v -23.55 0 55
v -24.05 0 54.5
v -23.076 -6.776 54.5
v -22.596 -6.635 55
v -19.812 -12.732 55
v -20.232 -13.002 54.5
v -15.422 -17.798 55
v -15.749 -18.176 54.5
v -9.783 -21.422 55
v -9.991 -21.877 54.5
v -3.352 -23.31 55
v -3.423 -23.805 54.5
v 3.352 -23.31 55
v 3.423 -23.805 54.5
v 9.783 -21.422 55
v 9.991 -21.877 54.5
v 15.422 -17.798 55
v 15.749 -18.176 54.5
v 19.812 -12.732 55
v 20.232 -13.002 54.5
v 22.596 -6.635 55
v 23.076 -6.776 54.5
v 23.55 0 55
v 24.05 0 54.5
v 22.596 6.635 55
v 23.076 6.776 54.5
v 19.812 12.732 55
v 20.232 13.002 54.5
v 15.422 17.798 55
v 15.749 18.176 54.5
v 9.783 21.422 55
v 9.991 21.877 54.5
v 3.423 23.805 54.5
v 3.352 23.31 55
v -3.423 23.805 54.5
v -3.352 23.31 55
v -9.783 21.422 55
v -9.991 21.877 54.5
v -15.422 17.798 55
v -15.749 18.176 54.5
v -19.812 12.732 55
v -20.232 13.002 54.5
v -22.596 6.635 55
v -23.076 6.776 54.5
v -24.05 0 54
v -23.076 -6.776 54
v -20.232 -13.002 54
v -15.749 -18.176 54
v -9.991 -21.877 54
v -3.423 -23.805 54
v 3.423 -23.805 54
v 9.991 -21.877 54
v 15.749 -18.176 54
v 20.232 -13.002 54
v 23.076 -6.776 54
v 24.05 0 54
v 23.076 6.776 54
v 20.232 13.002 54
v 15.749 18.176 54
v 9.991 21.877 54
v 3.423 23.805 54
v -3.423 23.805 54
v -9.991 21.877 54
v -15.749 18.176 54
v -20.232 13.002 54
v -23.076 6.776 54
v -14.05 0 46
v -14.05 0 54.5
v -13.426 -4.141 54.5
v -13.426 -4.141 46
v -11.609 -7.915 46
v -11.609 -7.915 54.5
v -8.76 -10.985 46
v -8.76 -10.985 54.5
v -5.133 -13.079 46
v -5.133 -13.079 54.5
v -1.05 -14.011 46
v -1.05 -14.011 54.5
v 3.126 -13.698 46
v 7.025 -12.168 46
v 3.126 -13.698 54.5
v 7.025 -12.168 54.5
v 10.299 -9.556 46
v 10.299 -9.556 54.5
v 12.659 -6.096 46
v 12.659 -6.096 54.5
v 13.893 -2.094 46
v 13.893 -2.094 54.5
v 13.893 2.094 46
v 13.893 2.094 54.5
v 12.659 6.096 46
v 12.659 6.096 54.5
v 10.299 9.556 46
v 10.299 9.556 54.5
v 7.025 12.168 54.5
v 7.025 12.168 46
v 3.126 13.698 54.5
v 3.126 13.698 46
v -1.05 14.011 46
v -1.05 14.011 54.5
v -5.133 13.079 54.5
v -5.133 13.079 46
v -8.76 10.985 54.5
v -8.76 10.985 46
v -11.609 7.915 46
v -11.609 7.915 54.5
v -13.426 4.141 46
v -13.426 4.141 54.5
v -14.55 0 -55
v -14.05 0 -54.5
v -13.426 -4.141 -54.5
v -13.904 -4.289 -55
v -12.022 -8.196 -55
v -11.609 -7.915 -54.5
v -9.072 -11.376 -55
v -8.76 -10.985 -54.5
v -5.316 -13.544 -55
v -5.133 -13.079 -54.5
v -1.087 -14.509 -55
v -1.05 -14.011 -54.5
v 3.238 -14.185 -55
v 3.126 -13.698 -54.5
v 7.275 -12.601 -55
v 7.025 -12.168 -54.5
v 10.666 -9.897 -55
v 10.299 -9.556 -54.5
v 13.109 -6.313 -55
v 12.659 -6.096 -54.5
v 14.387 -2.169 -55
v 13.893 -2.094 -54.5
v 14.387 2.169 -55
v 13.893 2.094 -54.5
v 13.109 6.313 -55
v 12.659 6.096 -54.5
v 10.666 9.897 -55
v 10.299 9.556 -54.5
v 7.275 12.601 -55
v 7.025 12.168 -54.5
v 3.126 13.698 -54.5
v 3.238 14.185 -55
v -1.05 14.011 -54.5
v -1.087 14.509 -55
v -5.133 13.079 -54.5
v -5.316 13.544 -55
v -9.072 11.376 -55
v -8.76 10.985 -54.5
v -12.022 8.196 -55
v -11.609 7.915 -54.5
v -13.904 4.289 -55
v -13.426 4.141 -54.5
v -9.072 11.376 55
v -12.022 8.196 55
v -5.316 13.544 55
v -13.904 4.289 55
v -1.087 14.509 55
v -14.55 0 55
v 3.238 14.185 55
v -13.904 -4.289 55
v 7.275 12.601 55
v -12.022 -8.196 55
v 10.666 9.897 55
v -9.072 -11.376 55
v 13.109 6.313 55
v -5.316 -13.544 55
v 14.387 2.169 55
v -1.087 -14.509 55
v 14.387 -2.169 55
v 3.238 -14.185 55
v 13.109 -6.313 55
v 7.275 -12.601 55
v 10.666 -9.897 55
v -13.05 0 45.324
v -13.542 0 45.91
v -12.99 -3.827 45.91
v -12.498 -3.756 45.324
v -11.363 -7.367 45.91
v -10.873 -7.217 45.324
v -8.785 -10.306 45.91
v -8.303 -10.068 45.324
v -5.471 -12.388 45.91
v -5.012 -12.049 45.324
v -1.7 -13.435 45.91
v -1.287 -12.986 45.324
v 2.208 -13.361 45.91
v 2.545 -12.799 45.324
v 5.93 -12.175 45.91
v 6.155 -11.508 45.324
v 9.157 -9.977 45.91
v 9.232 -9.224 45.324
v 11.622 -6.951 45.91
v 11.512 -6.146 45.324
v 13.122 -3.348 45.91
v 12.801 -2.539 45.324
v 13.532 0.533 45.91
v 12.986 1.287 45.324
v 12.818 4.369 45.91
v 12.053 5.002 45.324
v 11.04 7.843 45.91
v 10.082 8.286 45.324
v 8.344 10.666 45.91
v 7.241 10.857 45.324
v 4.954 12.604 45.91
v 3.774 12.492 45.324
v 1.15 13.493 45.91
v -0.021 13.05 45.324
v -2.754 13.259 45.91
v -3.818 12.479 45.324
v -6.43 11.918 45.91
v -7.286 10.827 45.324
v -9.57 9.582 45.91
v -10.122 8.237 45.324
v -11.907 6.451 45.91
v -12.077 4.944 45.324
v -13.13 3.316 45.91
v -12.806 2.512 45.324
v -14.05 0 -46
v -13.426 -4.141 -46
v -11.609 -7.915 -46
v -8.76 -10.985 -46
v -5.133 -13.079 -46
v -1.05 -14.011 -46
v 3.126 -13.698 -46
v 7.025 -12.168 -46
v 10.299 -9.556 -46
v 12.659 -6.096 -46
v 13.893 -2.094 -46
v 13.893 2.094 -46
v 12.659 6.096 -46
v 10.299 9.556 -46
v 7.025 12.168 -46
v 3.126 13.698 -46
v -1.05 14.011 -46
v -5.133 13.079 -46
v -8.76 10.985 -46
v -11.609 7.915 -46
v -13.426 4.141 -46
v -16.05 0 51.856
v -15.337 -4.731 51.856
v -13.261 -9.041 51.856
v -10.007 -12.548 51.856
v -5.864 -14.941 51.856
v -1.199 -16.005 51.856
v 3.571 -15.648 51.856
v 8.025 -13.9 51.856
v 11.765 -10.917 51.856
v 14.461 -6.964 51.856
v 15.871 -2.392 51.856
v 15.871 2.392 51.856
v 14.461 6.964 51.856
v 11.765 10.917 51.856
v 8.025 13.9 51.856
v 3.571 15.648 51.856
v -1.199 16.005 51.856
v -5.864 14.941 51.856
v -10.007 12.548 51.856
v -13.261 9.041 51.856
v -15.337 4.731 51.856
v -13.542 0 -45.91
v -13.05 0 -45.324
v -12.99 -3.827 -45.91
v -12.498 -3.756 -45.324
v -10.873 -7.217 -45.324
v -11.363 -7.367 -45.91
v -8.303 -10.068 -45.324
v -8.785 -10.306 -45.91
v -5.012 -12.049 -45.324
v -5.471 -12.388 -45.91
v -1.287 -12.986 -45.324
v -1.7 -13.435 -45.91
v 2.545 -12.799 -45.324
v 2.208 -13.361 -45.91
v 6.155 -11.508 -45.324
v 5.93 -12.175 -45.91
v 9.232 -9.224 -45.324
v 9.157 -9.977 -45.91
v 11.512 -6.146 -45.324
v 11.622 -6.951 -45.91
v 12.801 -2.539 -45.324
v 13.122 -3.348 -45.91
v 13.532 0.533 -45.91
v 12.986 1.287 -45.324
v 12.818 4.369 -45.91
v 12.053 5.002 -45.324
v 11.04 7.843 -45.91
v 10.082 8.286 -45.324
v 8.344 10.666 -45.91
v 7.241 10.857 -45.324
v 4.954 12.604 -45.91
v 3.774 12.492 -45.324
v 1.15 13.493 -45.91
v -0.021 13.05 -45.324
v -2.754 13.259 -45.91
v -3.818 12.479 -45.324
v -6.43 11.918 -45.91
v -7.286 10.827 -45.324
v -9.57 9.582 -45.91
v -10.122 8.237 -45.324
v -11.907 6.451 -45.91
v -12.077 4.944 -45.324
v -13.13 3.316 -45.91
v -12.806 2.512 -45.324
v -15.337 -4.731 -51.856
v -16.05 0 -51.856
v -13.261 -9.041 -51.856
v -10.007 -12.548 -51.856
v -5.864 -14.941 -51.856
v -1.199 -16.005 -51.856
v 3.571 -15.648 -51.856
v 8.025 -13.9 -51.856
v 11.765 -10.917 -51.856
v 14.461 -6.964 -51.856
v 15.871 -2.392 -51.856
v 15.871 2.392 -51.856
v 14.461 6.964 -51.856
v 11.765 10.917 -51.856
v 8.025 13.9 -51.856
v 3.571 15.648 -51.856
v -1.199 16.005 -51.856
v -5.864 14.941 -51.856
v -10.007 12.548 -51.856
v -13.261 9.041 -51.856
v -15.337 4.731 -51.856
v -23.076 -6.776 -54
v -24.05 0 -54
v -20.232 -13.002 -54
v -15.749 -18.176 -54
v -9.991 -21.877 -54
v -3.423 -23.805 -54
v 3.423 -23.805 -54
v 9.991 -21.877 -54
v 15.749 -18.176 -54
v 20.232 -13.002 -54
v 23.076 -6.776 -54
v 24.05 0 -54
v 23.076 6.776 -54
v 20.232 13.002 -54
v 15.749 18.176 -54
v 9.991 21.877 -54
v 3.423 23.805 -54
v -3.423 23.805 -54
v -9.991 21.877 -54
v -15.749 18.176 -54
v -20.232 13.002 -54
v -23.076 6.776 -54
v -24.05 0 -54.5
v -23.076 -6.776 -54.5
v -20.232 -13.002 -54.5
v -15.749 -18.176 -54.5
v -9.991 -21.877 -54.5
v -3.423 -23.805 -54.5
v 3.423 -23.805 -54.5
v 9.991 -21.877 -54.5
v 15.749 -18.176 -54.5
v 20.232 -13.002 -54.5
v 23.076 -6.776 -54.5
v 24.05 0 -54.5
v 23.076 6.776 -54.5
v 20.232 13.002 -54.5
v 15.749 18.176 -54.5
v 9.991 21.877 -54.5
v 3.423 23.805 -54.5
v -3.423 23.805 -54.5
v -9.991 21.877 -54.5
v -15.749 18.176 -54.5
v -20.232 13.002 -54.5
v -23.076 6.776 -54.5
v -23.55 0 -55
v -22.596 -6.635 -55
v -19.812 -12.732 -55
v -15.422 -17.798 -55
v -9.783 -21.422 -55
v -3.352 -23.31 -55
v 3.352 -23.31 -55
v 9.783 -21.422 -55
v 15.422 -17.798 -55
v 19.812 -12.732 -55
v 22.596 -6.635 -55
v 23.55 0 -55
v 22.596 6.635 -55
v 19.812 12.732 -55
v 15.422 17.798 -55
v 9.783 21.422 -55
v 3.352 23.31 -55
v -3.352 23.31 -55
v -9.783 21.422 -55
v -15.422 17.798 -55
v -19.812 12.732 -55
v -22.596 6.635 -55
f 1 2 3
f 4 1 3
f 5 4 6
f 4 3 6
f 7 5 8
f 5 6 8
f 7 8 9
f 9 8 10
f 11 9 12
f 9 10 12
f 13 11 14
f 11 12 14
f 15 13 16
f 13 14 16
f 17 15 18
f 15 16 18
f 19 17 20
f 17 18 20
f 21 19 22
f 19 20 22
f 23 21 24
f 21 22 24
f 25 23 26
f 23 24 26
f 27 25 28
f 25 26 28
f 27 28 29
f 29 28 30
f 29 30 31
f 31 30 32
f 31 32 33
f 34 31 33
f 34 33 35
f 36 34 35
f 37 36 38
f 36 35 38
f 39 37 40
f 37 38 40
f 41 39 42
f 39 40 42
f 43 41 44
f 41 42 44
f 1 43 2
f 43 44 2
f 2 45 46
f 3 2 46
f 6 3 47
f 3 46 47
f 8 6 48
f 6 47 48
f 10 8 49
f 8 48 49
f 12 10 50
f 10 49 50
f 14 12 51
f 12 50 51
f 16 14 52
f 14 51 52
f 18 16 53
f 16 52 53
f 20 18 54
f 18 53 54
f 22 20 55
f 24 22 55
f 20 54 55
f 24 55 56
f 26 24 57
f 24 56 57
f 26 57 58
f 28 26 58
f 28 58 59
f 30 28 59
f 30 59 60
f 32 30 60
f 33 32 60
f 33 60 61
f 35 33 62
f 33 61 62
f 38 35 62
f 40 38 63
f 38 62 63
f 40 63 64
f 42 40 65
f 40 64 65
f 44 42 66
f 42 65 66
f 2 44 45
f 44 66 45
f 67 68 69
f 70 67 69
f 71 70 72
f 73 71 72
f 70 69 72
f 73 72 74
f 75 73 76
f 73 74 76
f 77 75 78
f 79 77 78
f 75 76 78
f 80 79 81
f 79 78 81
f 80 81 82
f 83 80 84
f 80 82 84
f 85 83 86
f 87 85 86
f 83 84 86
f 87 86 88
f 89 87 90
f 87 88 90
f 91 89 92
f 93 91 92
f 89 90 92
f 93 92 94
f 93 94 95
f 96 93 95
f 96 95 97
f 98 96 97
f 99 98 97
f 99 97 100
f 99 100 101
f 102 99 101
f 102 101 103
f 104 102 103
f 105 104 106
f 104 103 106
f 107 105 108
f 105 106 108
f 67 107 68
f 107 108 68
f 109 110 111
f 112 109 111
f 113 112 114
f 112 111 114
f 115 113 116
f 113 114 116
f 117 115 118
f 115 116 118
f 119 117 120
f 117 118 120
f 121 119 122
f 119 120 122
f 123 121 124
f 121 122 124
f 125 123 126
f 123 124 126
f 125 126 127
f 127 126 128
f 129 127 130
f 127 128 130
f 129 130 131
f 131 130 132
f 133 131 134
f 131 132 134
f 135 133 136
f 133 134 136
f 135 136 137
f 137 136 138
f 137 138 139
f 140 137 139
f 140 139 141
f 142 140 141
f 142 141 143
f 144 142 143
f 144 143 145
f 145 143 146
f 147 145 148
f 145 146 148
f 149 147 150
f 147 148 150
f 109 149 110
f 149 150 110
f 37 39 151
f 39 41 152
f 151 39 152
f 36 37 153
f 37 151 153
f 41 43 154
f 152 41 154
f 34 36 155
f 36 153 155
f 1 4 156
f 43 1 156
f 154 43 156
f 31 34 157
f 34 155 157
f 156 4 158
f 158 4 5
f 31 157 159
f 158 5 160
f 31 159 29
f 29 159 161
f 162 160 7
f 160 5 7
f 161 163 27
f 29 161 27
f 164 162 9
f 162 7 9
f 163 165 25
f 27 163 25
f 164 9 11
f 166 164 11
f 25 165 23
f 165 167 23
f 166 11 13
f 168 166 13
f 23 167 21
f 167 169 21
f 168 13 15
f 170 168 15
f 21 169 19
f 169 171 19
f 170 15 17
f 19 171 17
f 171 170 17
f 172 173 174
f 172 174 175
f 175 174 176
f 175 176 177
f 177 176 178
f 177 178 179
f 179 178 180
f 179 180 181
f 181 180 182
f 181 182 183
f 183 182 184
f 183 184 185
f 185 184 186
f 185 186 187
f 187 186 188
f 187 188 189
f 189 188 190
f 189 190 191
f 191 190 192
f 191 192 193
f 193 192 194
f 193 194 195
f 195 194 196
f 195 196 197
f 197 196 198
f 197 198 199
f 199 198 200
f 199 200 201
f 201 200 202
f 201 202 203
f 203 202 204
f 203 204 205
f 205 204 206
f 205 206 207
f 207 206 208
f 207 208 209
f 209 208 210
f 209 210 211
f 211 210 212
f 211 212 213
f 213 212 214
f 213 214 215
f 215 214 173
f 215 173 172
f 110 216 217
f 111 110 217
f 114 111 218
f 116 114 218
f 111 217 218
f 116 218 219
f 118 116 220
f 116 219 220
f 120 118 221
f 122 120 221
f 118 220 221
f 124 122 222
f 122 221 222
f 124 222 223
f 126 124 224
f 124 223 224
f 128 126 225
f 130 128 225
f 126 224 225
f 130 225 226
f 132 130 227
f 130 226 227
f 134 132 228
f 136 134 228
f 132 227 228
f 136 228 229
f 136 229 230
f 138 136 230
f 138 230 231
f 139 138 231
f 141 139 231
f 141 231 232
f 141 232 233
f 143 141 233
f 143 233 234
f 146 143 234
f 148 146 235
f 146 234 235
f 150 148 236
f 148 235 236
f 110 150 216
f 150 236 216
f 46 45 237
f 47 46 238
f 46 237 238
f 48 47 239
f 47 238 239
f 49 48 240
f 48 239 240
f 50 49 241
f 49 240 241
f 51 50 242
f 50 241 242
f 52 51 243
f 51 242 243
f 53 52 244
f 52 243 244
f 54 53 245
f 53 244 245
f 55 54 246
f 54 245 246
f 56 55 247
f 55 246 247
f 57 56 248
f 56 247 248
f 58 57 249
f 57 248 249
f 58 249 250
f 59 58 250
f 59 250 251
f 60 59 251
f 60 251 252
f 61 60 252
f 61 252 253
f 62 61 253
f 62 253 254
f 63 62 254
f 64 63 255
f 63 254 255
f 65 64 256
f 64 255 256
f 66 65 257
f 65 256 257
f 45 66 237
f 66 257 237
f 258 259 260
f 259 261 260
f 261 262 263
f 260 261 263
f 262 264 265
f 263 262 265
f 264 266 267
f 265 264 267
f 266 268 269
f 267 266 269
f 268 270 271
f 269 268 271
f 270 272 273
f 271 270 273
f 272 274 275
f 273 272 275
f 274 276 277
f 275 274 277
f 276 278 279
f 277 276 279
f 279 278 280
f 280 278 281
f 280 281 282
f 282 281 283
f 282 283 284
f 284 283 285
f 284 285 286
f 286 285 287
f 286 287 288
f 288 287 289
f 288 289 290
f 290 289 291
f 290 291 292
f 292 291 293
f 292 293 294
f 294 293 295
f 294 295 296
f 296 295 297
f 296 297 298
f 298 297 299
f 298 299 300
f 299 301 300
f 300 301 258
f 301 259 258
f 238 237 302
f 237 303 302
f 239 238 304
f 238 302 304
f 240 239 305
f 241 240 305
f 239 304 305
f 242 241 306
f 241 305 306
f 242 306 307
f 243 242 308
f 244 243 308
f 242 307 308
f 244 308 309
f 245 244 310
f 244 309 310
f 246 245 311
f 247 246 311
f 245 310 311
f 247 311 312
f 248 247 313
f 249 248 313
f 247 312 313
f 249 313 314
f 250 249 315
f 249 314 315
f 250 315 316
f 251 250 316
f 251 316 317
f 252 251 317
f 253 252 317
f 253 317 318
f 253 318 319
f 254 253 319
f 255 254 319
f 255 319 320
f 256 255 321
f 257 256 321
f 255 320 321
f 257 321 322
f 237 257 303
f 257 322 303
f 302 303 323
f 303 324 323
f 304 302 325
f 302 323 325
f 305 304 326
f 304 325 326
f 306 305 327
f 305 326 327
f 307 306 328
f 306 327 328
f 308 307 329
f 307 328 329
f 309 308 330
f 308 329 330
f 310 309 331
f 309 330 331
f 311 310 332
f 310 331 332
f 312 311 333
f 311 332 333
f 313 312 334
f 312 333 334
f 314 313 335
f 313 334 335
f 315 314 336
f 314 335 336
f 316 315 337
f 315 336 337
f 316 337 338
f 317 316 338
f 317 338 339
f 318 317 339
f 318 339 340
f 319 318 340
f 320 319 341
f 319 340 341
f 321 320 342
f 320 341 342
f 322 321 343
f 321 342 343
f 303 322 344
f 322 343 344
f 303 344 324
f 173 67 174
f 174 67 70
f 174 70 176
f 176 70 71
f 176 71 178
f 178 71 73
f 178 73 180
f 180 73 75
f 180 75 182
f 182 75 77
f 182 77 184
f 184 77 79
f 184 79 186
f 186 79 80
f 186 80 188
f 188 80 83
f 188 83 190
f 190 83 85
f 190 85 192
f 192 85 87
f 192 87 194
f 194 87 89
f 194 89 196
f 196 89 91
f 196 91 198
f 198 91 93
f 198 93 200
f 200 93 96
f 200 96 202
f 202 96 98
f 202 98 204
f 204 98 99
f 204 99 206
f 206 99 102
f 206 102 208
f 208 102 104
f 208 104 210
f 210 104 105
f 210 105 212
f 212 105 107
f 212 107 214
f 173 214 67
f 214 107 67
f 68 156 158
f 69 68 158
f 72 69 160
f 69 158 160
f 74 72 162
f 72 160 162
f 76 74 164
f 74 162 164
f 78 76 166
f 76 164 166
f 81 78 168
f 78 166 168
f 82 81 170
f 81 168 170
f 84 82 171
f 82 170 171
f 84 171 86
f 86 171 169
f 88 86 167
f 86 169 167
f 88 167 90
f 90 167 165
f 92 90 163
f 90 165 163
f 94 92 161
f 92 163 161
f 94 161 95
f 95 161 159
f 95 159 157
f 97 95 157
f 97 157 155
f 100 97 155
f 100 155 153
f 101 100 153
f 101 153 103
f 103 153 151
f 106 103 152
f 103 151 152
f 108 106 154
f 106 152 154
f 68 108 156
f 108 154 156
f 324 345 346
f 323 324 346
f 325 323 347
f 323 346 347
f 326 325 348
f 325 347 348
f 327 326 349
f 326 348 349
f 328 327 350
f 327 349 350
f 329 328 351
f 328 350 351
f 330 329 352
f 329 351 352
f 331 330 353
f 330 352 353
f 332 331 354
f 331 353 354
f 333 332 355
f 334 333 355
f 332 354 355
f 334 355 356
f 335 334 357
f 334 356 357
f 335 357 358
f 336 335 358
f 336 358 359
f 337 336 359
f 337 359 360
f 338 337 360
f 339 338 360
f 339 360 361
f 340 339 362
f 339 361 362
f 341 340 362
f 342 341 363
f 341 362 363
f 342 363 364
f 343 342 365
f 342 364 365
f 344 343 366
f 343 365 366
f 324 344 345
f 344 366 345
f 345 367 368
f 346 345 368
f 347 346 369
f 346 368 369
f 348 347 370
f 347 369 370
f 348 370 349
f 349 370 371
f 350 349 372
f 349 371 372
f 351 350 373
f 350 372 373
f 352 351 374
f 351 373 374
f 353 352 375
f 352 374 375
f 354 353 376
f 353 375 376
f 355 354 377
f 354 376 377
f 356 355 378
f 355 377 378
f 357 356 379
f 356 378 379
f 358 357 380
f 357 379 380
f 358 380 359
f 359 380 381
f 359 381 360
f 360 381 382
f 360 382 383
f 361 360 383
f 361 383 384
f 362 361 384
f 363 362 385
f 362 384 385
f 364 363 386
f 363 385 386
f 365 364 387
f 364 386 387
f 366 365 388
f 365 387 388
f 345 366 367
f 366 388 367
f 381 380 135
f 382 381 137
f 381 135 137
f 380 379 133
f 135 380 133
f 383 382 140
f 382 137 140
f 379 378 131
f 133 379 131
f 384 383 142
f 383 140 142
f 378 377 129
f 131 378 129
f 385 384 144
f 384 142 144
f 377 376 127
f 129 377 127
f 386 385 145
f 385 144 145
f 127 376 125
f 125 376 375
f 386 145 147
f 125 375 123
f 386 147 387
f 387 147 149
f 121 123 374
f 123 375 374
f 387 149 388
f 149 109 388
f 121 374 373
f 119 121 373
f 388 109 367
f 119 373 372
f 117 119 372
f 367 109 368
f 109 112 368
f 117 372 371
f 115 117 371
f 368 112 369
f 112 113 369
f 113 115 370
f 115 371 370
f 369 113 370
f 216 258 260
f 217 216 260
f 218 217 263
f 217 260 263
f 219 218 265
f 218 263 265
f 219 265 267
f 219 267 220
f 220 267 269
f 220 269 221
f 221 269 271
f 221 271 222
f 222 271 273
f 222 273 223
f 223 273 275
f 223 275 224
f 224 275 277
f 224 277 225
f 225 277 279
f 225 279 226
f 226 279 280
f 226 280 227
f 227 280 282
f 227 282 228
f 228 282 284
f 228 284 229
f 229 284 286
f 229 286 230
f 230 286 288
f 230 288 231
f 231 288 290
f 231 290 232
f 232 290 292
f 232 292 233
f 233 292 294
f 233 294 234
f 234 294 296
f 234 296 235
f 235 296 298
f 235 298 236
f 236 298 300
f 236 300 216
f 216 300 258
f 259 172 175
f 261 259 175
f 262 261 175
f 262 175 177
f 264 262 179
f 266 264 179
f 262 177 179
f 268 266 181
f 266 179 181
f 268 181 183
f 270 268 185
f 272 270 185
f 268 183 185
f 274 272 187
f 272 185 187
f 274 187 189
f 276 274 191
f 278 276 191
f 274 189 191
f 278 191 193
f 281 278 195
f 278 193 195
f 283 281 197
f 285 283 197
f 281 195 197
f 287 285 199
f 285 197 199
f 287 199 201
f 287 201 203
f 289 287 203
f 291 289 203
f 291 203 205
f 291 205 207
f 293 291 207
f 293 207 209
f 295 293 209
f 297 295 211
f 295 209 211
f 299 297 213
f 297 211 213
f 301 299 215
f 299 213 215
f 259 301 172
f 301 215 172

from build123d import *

# Parameters (mm, degrees)
F3_SIZE = 0.5
F4_SIZE = 0.5


with BuildPart() as f2:
    # F1 (on Front) → F2 (revolve)
    with BuildSketch(Plane.XZ):
        Polygon((-16.05, 0), (-13.05, 0), (-13.05, 45.823673), (-14.05, 46), (-14.05, 55), (-24.05, 55), (-24.05, 54), (-16.05, 51.856406), align=None)
        Polygon((-24.05, -55), (-14.05, -55), (-14.05, -46), (-13.05, -45.823673), (-13.05, 0), (-16.05, 0), (-16.05, -51.856406), (-24.05, -54), align=None)
    revolve(axis=Axis((0, 0, 37.963357), (0, 0, 1)))

    # F3
    f3_edges = [f2.edges().sort_by_distance(p)[0] for p in [
        (14.05, 0, -55),
        (14.05, 0, 55),
        (24.05, 0, -55),
        (24.05, 0, 55),
    ]]
    chamfer(f3_edges, length=F3_SIZE)

    # F4
    f4_edges = [f2.edges().sort_by_distance(p)[0] for p in [
        (13.05, 0, 45.823673),
        (13.05, 0, -45.823673),
    ]]
    chamfer(f4_edges, length=F4_SIZE)


solid = f2.part
